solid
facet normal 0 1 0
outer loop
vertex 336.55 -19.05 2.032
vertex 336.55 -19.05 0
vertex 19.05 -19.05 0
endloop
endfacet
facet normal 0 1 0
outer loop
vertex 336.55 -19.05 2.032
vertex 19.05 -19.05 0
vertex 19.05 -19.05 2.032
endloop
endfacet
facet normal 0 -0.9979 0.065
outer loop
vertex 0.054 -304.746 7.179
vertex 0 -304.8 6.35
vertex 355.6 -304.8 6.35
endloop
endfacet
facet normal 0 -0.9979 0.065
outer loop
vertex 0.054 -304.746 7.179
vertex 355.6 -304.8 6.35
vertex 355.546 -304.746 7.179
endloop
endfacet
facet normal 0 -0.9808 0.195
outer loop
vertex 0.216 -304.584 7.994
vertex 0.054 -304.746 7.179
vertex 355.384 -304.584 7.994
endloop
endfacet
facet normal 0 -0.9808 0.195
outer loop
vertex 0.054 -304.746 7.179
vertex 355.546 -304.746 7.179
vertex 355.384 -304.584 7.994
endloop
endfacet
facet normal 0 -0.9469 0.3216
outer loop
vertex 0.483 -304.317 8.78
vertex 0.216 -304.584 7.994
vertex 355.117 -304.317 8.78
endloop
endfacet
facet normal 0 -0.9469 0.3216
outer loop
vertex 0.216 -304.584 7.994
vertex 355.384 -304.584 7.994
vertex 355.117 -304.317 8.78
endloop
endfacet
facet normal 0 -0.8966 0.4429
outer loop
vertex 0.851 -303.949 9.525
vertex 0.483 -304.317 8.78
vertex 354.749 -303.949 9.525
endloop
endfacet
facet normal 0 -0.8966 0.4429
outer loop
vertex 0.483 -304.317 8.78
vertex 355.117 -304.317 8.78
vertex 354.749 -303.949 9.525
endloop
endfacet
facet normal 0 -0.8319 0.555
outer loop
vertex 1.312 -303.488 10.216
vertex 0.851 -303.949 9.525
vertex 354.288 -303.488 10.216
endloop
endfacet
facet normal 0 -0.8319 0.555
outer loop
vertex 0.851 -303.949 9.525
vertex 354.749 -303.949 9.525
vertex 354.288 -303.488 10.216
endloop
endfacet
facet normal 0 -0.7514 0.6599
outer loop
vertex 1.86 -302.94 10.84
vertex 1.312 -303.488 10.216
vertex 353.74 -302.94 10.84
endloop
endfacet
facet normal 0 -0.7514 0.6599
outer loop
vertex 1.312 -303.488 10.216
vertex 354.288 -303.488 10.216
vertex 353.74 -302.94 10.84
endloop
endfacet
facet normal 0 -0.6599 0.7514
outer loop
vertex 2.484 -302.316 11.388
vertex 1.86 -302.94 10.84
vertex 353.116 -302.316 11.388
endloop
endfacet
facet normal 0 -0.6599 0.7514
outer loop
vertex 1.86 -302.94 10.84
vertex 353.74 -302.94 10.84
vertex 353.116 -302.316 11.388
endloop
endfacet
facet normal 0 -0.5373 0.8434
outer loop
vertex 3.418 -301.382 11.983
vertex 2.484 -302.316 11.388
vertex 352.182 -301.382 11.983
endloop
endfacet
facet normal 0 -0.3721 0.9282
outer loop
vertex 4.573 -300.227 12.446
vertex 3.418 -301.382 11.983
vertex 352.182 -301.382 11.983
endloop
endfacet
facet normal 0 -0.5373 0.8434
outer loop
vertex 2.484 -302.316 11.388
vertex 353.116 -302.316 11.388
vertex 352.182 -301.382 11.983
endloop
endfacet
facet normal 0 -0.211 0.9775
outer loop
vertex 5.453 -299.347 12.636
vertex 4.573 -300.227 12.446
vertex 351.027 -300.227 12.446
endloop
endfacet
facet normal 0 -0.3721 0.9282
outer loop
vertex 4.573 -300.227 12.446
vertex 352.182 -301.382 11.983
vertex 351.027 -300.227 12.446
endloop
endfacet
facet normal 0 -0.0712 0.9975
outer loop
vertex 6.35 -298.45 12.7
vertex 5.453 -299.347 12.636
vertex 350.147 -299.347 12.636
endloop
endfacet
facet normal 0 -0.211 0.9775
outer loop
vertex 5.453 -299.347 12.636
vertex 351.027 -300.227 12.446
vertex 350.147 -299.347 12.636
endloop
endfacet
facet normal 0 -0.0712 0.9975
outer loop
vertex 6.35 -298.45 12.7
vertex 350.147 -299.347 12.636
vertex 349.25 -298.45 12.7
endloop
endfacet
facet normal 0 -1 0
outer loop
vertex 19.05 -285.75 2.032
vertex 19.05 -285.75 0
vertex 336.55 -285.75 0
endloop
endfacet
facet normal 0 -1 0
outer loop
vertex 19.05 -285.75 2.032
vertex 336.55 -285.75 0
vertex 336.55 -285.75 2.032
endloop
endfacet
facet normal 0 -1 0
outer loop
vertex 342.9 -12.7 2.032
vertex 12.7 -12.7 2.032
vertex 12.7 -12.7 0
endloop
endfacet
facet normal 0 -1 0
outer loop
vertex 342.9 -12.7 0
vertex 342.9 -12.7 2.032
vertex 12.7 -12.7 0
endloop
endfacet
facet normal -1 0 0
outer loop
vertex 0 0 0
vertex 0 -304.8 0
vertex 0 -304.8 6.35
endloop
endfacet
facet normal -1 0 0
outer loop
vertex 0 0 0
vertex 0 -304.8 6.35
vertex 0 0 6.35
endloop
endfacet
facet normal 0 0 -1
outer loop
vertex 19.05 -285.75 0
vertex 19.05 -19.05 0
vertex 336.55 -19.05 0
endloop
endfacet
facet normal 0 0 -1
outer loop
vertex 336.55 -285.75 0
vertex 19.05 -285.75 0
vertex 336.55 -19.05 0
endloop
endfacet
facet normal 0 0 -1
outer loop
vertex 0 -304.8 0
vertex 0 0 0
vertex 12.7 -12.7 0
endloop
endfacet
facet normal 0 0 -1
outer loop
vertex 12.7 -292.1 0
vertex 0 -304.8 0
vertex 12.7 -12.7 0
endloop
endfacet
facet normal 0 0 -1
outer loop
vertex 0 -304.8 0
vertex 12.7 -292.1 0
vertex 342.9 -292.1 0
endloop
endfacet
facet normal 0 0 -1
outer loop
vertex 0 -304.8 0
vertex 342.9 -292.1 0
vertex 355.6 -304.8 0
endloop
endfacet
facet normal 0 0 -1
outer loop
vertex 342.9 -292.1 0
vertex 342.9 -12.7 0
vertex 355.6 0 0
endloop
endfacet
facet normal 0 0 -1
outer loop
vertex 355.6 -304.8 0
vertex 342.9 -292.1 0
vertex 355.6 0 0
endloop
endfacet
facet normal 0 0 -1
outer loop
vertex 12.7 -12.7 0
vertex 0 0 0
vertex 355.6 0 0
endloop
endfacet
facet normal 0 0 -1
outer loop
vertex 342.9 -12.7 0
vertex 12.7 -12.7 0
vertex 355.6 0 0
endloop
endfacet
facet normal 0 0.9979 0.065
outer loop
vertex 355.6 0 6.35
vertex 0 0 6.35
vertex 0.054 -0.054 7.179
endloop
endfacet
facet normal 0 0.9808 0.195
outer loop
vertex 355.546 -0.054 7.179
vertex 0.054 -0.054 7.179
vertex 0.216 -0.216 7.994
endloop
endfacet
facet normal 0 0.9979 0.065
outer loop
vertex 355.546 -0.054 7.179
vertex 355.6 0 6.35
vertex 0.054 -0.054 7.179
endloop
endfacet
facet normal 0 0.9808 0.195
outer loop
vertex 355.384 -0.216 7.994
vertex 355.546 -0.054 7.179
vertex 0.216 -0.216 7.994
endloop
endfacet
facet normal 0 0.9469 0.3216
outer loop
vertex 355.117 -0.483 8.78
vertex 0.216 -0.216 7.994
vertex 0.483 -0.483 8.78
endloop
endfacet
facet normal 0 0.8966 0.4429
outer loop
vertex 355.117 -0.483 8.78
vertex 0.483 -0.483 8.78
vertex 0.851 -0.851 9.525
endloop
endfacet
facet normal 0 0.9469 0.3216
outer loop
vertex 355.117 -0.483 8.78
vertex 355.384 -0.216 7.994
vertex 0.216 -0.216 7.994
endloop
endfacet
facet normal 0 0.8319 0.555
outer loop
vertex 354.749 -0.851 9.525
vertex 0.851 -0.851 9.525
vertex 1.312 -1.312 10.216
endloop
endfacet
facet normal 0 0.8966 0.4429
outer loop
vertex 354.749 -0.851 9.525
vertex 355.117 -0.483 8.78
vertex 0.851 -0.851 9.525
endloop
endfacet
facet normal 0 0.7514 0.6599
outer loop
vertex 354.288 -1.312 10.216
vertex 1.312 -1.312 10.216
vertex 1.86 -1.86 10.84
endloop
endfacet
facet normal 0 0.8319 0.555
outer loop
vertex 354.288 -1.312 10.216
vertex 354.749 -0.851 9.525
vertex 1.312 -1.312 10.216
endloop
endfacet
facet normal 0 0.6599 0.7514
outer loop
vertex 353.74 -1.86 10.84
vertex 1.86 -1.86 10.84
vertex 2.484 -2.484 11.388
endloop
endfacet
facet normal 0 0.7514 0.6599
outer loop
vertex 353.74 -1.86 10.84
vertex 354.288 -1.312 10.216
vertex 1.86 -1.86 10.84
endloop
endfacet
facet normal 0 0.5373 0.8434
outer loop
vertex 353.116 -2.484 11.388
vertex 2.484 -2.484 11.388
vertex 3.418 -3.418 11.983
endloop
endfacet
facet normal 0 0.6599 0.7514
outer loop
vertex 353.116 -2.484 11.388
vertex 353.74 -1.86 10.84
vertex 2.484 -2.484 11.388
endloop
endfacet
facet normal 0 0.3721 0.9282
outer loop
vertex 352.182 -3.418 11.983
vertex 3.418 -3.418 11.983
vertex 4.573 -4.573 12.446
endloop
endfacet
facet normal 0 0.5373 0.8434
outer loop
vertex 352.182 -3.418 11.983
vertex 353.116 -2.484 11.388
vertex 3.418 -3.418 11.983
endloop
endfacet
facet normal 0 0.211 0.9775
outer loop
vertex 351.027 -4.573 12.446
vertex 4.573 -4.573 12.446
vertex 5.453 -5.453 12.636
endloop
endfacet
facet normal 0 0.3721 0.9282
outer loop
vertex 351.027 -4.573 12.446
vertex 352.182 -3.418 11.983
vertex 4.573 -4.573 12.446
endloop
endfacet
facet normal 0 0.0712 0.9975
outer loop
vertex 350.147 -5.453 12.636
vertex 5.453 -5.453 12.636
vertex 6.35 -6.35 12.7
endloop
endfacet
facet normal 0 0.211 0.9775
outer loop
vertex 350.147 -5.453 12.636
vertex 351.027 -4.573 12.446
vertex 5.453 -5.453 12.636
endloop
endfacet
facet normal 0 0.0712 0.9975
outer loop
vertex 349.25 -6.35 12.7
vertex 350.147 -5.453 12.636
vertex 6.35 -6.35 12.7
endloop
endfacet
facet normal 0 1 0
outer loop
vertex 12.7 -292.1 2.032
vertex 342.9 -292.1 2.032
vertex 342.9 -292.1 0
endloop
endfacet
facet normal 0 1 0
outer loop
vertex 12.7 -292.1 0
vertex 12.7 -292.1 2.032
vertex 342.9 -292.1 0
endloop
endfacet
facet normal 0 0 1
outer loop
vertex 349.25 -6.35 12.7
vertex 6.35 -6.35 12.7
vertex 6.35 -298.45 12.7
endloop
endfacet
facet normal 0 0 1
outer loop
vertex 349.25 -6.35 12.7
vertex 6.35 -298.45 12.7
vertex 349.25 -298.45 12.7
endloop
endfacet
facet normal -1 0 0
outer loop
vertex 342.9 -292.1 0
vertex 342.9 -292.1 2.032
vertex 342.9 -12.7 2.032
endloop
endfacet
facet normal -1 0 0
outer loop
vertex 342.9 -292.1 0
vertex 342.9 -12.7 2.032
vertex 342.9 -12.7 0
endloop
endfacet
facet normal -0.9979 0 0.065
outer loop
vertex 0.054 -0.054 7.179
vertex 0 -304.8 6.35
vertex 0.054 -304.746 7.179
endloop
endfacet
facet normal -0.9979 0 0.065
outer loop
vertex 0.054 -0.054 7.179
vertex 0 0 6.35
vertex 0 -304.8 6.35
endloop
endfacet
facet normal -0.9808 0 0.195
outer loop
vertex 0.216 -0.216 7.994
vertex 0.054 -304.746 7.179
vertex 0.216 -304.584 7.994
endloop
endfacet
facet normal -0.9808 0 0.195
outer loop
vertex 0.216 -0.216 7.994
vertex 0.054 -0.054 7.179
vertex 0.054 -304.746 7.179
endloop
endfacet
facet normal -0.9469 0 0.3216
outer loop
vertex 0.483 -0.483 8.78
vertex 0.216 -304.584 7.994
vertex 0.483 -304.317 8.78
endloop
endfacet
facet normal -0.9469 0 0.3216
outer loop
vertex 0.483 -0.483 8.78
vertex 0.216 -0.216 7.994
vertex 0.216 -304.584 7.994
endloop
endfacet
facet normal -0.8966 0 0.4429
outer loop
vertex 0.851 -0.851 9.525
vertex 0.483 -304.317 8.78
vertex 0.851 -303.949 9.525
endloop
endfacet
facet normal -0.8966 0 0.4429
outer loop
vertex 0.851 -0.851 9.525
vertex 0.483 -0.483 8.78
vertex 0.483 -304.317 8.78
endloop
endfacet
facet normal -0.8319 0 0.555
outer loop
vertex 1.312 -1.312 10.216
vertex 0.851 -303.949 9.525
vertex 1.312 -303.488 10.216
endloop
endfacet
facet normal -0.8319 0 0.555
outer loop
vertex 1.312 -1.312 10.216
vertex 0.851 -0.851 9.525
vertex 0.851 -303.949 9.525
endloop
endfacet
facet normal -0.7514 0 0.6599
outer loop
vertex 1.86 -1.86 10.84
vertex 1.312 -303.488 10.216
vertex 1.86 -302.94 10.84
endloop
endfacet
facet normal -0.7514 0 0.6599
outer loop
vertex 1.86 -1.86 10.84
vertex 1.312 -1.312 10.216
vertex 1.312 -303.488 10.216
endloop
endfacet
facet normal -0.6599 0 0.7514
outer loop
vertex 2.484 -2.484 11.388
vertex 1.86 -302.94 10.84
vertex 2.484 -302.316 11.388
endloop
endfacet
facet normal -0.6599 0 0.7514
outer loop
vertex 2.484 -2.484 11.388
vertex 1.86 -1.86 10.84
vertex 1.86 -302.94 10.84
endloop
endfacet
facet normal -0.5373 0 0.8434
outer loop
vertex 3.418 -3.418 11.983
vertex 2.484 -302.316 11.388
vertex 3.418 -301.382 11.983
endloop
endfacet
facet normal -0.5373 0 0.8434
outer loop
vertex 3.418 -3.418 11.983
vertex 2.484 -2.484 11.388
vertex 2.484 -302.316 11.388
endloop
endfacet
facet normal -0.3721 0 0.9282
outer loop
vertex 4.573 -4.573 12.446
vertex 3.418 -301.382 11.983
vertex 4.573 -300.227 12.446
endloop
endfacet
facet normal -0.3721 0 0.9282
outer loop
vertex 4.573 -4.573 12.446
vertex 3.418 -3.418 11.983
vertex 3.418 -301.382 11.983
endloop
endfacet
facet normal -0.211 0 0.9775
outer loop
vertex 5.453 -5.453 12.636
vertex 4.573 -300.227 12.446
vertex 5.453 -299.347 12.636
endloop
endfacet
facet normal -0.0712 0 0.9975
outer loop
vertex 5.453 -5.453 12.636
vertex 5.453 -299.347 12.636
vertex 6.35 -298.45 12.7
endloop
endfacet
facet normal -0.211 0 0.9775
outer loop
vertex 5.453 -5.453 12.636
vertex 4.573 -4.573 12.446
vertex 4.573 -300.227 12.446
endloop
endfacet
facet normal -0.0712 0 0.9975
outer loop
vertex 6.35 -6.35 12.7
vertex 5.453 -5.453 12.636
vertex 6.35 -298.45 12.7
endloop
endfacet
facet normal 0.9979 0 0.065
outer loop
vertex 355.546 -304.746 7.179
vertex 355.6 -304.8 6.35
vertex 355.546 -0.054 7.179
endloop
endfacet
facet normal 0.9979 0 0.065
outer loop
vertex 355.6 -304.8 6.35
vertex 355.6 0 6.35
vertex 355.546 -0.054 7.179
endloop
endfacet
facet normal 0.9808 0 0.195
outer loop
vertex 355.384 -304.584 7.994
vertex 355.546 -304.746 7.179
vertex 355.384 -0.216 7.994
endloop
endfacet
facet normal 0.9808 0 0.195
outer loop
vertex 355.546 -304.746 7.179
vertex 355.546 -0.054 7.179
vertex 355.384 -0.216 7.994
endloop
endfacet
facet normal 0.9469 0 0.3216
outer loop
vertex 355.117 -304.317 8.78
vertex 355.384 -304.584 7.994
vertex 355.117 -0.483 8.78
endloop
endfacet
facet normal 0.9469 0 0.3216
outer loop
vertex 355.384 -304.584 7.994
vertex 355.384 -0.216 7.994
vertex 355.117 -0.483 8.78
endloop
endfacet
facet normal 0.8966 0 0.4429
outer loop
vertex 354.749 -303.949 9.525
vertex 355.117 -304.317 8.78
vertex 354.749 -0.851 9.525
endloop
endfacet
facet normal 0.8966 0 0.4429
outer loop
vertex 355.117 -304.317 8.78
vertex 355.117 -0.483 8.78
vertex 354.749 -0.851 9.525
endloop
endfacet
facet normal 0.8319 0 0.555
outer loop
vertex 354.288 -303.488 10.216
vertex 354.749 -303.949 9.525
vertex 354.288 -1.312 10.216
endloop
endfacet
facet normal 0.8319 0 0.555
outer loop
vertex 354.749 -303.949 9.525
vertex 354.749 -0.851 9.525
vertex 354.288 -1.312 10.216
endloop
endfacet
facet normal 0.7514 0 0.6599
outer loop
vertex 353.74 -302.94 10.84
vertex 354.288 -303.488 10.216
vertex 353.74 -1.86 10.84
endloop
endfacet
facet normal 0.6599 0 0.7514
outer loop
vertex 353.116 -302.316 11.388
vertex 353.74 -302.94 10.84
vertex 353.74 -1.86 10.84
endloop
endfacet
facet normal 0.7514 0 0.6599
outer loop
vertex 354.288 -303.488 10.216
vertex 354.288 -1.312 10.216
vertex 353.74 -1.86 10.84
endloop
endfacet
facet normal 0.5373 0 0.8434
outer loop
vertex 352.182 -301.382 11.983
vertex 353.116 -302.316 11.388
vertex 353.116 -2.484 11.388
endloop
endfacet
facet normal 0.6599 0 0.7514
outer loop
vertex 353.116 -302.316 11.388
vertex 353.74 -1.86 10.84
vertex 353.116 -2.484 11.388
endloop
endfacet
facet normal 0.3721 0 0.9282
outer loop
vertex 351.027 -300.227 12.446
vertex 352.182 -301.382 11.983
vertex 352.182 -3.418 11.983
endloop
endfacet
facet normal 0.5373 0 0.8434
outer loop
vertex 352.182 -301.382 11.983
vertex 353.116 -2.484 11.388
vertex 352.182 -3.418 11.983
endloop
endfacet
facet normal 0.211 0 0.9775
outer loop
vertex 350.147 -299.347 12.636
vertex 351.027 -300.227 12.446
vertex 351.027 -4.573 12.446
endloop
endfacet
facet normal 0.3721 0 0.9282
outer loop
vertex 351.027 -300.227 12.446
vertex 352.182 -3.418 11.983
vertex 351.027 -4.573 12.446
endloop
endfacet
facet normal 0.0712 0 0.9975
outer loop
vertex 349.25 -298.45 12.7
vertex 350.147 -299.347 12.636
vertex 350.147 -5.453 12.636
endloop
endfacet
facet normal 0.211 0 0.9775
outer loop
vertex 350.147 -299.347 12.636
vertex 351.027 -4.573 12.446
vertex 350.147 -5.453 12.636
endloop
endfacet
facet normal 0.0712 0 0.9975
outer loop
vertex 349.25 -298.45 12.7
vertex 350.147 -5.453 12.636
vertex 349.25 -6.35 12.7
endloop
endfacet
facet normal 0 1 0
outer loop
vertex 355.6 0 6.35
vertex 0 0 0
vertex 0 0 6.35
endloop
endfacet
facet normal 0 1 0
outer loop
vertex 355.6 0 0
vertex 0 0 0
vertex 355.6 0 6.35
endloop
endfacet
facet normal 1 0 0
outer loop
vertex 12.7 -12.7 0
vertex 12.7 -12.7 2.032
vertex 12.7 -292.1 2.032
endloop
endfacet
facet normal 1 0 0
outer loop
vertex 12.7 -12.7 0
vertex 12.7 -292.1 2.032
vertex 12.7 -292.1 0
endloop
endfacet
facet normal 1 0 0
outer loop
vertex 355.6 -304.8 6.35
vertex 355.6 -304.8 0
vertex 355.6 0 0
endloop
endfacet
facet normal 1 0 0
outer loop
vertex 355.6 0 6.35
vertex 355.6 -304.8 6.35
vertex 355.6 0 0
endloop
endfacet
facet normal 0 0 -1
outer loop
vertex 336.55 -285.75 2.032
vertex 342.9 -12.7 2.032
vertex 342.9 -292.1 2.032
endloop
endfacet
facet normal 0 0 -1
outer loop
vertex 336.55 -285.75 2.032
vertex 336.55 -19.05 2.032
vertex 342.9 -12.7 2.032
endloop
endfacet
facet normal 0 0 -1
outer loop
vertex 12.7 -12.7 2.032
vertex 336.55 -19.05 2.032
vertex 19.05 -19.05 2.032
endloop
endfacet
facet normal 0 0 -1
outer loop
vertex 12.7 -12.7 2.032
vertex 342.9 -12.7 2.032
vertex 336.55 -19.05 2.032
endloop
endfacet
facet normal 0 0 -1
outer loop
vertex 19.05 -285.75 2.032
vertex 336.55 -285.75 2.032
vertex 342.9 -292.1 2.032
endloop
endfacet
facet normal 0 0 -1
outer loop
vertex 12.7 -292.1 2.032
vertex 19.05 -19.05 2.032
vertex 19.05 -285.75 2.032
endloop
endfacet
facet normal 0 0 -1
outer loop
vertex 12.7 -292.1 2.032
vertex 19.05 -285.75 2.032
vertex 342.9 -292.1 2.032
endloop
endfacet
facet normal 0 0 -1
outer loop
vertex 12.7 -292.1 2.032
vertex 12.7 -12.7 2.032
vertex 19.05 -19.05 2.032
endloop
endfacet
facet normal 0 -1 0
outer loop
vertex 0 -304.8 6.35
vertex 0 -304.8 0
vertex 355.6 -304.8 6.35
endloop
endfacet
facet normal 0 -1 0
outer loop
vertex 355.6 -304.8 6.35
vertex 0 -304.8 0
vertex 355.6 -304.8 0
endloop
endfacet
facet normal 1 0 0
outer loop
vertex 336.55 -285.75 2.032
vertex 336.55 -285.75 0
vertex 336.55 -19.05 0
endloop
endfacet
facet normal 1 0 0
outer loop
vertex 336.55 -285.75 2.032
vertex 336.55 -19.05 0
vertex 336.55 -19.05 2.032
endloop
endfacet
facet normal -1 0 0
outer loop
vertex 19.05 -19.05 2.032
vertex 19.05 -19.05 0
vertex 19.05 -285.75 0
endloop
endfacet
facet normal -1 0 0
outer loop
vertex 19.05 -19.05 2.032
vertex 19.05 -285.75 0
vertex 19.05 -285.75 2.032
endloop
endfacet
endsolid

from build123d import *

# Parameters (mm, degrees)
F0_W     = 355.6
F0_H     = 304.8
F1_DEPTH = 12.7
F2_R     = 6.35
F5_W     = 6.35
F5_H     = 2.032


with BuildPart() as f1:
    # F0 (on Top) → F1 (new body)
    with BuildSketch(Plane.XY):
        with Locations((177.8, -152.4)):
            Rectangle(F0_W, F0_H)
    extrude(amount=F1_DEPTH)

    # F2
    f2_edges = [f1.edges().sort_by_distance(p)[0] for p in [
        (0, -152.4, 12.7),
        (177.8, -304.8, 12.7),
        (355.6, -152.4, 12.7),
        (177.8, 0, 12.7),
    ]]
    fillet(f2_edges, radius=F2_R)

    # F6: sweep along a path in F3
    with BuildLine(Plane(origin=(0, 0, 0), x_dir=(1, 0, 0), z_dir=(0, 0, -1))) as f6_path:
        Line((12.7, 292.1), (12.7, 12.7))
        Line((12.7, 12.7), (342.9, 12.7))
        Line((342.9, 12.7), (342.9, 292.1))
        Line((342.9, 292.1), (12.7, 292.1))
    # F5 (on plane+point) → F6 (sweep, cut)
    with BuildSketch(Plane.XZ.offset(12.7)):
        with Locations((15.875, 1.016)):
            Rectangle(F5_W, F5_H)
    sweep(path=f6_path.line, transition=Transition.RIGHT, mode=Mode.SUBTRACT)


solid = f1.part
